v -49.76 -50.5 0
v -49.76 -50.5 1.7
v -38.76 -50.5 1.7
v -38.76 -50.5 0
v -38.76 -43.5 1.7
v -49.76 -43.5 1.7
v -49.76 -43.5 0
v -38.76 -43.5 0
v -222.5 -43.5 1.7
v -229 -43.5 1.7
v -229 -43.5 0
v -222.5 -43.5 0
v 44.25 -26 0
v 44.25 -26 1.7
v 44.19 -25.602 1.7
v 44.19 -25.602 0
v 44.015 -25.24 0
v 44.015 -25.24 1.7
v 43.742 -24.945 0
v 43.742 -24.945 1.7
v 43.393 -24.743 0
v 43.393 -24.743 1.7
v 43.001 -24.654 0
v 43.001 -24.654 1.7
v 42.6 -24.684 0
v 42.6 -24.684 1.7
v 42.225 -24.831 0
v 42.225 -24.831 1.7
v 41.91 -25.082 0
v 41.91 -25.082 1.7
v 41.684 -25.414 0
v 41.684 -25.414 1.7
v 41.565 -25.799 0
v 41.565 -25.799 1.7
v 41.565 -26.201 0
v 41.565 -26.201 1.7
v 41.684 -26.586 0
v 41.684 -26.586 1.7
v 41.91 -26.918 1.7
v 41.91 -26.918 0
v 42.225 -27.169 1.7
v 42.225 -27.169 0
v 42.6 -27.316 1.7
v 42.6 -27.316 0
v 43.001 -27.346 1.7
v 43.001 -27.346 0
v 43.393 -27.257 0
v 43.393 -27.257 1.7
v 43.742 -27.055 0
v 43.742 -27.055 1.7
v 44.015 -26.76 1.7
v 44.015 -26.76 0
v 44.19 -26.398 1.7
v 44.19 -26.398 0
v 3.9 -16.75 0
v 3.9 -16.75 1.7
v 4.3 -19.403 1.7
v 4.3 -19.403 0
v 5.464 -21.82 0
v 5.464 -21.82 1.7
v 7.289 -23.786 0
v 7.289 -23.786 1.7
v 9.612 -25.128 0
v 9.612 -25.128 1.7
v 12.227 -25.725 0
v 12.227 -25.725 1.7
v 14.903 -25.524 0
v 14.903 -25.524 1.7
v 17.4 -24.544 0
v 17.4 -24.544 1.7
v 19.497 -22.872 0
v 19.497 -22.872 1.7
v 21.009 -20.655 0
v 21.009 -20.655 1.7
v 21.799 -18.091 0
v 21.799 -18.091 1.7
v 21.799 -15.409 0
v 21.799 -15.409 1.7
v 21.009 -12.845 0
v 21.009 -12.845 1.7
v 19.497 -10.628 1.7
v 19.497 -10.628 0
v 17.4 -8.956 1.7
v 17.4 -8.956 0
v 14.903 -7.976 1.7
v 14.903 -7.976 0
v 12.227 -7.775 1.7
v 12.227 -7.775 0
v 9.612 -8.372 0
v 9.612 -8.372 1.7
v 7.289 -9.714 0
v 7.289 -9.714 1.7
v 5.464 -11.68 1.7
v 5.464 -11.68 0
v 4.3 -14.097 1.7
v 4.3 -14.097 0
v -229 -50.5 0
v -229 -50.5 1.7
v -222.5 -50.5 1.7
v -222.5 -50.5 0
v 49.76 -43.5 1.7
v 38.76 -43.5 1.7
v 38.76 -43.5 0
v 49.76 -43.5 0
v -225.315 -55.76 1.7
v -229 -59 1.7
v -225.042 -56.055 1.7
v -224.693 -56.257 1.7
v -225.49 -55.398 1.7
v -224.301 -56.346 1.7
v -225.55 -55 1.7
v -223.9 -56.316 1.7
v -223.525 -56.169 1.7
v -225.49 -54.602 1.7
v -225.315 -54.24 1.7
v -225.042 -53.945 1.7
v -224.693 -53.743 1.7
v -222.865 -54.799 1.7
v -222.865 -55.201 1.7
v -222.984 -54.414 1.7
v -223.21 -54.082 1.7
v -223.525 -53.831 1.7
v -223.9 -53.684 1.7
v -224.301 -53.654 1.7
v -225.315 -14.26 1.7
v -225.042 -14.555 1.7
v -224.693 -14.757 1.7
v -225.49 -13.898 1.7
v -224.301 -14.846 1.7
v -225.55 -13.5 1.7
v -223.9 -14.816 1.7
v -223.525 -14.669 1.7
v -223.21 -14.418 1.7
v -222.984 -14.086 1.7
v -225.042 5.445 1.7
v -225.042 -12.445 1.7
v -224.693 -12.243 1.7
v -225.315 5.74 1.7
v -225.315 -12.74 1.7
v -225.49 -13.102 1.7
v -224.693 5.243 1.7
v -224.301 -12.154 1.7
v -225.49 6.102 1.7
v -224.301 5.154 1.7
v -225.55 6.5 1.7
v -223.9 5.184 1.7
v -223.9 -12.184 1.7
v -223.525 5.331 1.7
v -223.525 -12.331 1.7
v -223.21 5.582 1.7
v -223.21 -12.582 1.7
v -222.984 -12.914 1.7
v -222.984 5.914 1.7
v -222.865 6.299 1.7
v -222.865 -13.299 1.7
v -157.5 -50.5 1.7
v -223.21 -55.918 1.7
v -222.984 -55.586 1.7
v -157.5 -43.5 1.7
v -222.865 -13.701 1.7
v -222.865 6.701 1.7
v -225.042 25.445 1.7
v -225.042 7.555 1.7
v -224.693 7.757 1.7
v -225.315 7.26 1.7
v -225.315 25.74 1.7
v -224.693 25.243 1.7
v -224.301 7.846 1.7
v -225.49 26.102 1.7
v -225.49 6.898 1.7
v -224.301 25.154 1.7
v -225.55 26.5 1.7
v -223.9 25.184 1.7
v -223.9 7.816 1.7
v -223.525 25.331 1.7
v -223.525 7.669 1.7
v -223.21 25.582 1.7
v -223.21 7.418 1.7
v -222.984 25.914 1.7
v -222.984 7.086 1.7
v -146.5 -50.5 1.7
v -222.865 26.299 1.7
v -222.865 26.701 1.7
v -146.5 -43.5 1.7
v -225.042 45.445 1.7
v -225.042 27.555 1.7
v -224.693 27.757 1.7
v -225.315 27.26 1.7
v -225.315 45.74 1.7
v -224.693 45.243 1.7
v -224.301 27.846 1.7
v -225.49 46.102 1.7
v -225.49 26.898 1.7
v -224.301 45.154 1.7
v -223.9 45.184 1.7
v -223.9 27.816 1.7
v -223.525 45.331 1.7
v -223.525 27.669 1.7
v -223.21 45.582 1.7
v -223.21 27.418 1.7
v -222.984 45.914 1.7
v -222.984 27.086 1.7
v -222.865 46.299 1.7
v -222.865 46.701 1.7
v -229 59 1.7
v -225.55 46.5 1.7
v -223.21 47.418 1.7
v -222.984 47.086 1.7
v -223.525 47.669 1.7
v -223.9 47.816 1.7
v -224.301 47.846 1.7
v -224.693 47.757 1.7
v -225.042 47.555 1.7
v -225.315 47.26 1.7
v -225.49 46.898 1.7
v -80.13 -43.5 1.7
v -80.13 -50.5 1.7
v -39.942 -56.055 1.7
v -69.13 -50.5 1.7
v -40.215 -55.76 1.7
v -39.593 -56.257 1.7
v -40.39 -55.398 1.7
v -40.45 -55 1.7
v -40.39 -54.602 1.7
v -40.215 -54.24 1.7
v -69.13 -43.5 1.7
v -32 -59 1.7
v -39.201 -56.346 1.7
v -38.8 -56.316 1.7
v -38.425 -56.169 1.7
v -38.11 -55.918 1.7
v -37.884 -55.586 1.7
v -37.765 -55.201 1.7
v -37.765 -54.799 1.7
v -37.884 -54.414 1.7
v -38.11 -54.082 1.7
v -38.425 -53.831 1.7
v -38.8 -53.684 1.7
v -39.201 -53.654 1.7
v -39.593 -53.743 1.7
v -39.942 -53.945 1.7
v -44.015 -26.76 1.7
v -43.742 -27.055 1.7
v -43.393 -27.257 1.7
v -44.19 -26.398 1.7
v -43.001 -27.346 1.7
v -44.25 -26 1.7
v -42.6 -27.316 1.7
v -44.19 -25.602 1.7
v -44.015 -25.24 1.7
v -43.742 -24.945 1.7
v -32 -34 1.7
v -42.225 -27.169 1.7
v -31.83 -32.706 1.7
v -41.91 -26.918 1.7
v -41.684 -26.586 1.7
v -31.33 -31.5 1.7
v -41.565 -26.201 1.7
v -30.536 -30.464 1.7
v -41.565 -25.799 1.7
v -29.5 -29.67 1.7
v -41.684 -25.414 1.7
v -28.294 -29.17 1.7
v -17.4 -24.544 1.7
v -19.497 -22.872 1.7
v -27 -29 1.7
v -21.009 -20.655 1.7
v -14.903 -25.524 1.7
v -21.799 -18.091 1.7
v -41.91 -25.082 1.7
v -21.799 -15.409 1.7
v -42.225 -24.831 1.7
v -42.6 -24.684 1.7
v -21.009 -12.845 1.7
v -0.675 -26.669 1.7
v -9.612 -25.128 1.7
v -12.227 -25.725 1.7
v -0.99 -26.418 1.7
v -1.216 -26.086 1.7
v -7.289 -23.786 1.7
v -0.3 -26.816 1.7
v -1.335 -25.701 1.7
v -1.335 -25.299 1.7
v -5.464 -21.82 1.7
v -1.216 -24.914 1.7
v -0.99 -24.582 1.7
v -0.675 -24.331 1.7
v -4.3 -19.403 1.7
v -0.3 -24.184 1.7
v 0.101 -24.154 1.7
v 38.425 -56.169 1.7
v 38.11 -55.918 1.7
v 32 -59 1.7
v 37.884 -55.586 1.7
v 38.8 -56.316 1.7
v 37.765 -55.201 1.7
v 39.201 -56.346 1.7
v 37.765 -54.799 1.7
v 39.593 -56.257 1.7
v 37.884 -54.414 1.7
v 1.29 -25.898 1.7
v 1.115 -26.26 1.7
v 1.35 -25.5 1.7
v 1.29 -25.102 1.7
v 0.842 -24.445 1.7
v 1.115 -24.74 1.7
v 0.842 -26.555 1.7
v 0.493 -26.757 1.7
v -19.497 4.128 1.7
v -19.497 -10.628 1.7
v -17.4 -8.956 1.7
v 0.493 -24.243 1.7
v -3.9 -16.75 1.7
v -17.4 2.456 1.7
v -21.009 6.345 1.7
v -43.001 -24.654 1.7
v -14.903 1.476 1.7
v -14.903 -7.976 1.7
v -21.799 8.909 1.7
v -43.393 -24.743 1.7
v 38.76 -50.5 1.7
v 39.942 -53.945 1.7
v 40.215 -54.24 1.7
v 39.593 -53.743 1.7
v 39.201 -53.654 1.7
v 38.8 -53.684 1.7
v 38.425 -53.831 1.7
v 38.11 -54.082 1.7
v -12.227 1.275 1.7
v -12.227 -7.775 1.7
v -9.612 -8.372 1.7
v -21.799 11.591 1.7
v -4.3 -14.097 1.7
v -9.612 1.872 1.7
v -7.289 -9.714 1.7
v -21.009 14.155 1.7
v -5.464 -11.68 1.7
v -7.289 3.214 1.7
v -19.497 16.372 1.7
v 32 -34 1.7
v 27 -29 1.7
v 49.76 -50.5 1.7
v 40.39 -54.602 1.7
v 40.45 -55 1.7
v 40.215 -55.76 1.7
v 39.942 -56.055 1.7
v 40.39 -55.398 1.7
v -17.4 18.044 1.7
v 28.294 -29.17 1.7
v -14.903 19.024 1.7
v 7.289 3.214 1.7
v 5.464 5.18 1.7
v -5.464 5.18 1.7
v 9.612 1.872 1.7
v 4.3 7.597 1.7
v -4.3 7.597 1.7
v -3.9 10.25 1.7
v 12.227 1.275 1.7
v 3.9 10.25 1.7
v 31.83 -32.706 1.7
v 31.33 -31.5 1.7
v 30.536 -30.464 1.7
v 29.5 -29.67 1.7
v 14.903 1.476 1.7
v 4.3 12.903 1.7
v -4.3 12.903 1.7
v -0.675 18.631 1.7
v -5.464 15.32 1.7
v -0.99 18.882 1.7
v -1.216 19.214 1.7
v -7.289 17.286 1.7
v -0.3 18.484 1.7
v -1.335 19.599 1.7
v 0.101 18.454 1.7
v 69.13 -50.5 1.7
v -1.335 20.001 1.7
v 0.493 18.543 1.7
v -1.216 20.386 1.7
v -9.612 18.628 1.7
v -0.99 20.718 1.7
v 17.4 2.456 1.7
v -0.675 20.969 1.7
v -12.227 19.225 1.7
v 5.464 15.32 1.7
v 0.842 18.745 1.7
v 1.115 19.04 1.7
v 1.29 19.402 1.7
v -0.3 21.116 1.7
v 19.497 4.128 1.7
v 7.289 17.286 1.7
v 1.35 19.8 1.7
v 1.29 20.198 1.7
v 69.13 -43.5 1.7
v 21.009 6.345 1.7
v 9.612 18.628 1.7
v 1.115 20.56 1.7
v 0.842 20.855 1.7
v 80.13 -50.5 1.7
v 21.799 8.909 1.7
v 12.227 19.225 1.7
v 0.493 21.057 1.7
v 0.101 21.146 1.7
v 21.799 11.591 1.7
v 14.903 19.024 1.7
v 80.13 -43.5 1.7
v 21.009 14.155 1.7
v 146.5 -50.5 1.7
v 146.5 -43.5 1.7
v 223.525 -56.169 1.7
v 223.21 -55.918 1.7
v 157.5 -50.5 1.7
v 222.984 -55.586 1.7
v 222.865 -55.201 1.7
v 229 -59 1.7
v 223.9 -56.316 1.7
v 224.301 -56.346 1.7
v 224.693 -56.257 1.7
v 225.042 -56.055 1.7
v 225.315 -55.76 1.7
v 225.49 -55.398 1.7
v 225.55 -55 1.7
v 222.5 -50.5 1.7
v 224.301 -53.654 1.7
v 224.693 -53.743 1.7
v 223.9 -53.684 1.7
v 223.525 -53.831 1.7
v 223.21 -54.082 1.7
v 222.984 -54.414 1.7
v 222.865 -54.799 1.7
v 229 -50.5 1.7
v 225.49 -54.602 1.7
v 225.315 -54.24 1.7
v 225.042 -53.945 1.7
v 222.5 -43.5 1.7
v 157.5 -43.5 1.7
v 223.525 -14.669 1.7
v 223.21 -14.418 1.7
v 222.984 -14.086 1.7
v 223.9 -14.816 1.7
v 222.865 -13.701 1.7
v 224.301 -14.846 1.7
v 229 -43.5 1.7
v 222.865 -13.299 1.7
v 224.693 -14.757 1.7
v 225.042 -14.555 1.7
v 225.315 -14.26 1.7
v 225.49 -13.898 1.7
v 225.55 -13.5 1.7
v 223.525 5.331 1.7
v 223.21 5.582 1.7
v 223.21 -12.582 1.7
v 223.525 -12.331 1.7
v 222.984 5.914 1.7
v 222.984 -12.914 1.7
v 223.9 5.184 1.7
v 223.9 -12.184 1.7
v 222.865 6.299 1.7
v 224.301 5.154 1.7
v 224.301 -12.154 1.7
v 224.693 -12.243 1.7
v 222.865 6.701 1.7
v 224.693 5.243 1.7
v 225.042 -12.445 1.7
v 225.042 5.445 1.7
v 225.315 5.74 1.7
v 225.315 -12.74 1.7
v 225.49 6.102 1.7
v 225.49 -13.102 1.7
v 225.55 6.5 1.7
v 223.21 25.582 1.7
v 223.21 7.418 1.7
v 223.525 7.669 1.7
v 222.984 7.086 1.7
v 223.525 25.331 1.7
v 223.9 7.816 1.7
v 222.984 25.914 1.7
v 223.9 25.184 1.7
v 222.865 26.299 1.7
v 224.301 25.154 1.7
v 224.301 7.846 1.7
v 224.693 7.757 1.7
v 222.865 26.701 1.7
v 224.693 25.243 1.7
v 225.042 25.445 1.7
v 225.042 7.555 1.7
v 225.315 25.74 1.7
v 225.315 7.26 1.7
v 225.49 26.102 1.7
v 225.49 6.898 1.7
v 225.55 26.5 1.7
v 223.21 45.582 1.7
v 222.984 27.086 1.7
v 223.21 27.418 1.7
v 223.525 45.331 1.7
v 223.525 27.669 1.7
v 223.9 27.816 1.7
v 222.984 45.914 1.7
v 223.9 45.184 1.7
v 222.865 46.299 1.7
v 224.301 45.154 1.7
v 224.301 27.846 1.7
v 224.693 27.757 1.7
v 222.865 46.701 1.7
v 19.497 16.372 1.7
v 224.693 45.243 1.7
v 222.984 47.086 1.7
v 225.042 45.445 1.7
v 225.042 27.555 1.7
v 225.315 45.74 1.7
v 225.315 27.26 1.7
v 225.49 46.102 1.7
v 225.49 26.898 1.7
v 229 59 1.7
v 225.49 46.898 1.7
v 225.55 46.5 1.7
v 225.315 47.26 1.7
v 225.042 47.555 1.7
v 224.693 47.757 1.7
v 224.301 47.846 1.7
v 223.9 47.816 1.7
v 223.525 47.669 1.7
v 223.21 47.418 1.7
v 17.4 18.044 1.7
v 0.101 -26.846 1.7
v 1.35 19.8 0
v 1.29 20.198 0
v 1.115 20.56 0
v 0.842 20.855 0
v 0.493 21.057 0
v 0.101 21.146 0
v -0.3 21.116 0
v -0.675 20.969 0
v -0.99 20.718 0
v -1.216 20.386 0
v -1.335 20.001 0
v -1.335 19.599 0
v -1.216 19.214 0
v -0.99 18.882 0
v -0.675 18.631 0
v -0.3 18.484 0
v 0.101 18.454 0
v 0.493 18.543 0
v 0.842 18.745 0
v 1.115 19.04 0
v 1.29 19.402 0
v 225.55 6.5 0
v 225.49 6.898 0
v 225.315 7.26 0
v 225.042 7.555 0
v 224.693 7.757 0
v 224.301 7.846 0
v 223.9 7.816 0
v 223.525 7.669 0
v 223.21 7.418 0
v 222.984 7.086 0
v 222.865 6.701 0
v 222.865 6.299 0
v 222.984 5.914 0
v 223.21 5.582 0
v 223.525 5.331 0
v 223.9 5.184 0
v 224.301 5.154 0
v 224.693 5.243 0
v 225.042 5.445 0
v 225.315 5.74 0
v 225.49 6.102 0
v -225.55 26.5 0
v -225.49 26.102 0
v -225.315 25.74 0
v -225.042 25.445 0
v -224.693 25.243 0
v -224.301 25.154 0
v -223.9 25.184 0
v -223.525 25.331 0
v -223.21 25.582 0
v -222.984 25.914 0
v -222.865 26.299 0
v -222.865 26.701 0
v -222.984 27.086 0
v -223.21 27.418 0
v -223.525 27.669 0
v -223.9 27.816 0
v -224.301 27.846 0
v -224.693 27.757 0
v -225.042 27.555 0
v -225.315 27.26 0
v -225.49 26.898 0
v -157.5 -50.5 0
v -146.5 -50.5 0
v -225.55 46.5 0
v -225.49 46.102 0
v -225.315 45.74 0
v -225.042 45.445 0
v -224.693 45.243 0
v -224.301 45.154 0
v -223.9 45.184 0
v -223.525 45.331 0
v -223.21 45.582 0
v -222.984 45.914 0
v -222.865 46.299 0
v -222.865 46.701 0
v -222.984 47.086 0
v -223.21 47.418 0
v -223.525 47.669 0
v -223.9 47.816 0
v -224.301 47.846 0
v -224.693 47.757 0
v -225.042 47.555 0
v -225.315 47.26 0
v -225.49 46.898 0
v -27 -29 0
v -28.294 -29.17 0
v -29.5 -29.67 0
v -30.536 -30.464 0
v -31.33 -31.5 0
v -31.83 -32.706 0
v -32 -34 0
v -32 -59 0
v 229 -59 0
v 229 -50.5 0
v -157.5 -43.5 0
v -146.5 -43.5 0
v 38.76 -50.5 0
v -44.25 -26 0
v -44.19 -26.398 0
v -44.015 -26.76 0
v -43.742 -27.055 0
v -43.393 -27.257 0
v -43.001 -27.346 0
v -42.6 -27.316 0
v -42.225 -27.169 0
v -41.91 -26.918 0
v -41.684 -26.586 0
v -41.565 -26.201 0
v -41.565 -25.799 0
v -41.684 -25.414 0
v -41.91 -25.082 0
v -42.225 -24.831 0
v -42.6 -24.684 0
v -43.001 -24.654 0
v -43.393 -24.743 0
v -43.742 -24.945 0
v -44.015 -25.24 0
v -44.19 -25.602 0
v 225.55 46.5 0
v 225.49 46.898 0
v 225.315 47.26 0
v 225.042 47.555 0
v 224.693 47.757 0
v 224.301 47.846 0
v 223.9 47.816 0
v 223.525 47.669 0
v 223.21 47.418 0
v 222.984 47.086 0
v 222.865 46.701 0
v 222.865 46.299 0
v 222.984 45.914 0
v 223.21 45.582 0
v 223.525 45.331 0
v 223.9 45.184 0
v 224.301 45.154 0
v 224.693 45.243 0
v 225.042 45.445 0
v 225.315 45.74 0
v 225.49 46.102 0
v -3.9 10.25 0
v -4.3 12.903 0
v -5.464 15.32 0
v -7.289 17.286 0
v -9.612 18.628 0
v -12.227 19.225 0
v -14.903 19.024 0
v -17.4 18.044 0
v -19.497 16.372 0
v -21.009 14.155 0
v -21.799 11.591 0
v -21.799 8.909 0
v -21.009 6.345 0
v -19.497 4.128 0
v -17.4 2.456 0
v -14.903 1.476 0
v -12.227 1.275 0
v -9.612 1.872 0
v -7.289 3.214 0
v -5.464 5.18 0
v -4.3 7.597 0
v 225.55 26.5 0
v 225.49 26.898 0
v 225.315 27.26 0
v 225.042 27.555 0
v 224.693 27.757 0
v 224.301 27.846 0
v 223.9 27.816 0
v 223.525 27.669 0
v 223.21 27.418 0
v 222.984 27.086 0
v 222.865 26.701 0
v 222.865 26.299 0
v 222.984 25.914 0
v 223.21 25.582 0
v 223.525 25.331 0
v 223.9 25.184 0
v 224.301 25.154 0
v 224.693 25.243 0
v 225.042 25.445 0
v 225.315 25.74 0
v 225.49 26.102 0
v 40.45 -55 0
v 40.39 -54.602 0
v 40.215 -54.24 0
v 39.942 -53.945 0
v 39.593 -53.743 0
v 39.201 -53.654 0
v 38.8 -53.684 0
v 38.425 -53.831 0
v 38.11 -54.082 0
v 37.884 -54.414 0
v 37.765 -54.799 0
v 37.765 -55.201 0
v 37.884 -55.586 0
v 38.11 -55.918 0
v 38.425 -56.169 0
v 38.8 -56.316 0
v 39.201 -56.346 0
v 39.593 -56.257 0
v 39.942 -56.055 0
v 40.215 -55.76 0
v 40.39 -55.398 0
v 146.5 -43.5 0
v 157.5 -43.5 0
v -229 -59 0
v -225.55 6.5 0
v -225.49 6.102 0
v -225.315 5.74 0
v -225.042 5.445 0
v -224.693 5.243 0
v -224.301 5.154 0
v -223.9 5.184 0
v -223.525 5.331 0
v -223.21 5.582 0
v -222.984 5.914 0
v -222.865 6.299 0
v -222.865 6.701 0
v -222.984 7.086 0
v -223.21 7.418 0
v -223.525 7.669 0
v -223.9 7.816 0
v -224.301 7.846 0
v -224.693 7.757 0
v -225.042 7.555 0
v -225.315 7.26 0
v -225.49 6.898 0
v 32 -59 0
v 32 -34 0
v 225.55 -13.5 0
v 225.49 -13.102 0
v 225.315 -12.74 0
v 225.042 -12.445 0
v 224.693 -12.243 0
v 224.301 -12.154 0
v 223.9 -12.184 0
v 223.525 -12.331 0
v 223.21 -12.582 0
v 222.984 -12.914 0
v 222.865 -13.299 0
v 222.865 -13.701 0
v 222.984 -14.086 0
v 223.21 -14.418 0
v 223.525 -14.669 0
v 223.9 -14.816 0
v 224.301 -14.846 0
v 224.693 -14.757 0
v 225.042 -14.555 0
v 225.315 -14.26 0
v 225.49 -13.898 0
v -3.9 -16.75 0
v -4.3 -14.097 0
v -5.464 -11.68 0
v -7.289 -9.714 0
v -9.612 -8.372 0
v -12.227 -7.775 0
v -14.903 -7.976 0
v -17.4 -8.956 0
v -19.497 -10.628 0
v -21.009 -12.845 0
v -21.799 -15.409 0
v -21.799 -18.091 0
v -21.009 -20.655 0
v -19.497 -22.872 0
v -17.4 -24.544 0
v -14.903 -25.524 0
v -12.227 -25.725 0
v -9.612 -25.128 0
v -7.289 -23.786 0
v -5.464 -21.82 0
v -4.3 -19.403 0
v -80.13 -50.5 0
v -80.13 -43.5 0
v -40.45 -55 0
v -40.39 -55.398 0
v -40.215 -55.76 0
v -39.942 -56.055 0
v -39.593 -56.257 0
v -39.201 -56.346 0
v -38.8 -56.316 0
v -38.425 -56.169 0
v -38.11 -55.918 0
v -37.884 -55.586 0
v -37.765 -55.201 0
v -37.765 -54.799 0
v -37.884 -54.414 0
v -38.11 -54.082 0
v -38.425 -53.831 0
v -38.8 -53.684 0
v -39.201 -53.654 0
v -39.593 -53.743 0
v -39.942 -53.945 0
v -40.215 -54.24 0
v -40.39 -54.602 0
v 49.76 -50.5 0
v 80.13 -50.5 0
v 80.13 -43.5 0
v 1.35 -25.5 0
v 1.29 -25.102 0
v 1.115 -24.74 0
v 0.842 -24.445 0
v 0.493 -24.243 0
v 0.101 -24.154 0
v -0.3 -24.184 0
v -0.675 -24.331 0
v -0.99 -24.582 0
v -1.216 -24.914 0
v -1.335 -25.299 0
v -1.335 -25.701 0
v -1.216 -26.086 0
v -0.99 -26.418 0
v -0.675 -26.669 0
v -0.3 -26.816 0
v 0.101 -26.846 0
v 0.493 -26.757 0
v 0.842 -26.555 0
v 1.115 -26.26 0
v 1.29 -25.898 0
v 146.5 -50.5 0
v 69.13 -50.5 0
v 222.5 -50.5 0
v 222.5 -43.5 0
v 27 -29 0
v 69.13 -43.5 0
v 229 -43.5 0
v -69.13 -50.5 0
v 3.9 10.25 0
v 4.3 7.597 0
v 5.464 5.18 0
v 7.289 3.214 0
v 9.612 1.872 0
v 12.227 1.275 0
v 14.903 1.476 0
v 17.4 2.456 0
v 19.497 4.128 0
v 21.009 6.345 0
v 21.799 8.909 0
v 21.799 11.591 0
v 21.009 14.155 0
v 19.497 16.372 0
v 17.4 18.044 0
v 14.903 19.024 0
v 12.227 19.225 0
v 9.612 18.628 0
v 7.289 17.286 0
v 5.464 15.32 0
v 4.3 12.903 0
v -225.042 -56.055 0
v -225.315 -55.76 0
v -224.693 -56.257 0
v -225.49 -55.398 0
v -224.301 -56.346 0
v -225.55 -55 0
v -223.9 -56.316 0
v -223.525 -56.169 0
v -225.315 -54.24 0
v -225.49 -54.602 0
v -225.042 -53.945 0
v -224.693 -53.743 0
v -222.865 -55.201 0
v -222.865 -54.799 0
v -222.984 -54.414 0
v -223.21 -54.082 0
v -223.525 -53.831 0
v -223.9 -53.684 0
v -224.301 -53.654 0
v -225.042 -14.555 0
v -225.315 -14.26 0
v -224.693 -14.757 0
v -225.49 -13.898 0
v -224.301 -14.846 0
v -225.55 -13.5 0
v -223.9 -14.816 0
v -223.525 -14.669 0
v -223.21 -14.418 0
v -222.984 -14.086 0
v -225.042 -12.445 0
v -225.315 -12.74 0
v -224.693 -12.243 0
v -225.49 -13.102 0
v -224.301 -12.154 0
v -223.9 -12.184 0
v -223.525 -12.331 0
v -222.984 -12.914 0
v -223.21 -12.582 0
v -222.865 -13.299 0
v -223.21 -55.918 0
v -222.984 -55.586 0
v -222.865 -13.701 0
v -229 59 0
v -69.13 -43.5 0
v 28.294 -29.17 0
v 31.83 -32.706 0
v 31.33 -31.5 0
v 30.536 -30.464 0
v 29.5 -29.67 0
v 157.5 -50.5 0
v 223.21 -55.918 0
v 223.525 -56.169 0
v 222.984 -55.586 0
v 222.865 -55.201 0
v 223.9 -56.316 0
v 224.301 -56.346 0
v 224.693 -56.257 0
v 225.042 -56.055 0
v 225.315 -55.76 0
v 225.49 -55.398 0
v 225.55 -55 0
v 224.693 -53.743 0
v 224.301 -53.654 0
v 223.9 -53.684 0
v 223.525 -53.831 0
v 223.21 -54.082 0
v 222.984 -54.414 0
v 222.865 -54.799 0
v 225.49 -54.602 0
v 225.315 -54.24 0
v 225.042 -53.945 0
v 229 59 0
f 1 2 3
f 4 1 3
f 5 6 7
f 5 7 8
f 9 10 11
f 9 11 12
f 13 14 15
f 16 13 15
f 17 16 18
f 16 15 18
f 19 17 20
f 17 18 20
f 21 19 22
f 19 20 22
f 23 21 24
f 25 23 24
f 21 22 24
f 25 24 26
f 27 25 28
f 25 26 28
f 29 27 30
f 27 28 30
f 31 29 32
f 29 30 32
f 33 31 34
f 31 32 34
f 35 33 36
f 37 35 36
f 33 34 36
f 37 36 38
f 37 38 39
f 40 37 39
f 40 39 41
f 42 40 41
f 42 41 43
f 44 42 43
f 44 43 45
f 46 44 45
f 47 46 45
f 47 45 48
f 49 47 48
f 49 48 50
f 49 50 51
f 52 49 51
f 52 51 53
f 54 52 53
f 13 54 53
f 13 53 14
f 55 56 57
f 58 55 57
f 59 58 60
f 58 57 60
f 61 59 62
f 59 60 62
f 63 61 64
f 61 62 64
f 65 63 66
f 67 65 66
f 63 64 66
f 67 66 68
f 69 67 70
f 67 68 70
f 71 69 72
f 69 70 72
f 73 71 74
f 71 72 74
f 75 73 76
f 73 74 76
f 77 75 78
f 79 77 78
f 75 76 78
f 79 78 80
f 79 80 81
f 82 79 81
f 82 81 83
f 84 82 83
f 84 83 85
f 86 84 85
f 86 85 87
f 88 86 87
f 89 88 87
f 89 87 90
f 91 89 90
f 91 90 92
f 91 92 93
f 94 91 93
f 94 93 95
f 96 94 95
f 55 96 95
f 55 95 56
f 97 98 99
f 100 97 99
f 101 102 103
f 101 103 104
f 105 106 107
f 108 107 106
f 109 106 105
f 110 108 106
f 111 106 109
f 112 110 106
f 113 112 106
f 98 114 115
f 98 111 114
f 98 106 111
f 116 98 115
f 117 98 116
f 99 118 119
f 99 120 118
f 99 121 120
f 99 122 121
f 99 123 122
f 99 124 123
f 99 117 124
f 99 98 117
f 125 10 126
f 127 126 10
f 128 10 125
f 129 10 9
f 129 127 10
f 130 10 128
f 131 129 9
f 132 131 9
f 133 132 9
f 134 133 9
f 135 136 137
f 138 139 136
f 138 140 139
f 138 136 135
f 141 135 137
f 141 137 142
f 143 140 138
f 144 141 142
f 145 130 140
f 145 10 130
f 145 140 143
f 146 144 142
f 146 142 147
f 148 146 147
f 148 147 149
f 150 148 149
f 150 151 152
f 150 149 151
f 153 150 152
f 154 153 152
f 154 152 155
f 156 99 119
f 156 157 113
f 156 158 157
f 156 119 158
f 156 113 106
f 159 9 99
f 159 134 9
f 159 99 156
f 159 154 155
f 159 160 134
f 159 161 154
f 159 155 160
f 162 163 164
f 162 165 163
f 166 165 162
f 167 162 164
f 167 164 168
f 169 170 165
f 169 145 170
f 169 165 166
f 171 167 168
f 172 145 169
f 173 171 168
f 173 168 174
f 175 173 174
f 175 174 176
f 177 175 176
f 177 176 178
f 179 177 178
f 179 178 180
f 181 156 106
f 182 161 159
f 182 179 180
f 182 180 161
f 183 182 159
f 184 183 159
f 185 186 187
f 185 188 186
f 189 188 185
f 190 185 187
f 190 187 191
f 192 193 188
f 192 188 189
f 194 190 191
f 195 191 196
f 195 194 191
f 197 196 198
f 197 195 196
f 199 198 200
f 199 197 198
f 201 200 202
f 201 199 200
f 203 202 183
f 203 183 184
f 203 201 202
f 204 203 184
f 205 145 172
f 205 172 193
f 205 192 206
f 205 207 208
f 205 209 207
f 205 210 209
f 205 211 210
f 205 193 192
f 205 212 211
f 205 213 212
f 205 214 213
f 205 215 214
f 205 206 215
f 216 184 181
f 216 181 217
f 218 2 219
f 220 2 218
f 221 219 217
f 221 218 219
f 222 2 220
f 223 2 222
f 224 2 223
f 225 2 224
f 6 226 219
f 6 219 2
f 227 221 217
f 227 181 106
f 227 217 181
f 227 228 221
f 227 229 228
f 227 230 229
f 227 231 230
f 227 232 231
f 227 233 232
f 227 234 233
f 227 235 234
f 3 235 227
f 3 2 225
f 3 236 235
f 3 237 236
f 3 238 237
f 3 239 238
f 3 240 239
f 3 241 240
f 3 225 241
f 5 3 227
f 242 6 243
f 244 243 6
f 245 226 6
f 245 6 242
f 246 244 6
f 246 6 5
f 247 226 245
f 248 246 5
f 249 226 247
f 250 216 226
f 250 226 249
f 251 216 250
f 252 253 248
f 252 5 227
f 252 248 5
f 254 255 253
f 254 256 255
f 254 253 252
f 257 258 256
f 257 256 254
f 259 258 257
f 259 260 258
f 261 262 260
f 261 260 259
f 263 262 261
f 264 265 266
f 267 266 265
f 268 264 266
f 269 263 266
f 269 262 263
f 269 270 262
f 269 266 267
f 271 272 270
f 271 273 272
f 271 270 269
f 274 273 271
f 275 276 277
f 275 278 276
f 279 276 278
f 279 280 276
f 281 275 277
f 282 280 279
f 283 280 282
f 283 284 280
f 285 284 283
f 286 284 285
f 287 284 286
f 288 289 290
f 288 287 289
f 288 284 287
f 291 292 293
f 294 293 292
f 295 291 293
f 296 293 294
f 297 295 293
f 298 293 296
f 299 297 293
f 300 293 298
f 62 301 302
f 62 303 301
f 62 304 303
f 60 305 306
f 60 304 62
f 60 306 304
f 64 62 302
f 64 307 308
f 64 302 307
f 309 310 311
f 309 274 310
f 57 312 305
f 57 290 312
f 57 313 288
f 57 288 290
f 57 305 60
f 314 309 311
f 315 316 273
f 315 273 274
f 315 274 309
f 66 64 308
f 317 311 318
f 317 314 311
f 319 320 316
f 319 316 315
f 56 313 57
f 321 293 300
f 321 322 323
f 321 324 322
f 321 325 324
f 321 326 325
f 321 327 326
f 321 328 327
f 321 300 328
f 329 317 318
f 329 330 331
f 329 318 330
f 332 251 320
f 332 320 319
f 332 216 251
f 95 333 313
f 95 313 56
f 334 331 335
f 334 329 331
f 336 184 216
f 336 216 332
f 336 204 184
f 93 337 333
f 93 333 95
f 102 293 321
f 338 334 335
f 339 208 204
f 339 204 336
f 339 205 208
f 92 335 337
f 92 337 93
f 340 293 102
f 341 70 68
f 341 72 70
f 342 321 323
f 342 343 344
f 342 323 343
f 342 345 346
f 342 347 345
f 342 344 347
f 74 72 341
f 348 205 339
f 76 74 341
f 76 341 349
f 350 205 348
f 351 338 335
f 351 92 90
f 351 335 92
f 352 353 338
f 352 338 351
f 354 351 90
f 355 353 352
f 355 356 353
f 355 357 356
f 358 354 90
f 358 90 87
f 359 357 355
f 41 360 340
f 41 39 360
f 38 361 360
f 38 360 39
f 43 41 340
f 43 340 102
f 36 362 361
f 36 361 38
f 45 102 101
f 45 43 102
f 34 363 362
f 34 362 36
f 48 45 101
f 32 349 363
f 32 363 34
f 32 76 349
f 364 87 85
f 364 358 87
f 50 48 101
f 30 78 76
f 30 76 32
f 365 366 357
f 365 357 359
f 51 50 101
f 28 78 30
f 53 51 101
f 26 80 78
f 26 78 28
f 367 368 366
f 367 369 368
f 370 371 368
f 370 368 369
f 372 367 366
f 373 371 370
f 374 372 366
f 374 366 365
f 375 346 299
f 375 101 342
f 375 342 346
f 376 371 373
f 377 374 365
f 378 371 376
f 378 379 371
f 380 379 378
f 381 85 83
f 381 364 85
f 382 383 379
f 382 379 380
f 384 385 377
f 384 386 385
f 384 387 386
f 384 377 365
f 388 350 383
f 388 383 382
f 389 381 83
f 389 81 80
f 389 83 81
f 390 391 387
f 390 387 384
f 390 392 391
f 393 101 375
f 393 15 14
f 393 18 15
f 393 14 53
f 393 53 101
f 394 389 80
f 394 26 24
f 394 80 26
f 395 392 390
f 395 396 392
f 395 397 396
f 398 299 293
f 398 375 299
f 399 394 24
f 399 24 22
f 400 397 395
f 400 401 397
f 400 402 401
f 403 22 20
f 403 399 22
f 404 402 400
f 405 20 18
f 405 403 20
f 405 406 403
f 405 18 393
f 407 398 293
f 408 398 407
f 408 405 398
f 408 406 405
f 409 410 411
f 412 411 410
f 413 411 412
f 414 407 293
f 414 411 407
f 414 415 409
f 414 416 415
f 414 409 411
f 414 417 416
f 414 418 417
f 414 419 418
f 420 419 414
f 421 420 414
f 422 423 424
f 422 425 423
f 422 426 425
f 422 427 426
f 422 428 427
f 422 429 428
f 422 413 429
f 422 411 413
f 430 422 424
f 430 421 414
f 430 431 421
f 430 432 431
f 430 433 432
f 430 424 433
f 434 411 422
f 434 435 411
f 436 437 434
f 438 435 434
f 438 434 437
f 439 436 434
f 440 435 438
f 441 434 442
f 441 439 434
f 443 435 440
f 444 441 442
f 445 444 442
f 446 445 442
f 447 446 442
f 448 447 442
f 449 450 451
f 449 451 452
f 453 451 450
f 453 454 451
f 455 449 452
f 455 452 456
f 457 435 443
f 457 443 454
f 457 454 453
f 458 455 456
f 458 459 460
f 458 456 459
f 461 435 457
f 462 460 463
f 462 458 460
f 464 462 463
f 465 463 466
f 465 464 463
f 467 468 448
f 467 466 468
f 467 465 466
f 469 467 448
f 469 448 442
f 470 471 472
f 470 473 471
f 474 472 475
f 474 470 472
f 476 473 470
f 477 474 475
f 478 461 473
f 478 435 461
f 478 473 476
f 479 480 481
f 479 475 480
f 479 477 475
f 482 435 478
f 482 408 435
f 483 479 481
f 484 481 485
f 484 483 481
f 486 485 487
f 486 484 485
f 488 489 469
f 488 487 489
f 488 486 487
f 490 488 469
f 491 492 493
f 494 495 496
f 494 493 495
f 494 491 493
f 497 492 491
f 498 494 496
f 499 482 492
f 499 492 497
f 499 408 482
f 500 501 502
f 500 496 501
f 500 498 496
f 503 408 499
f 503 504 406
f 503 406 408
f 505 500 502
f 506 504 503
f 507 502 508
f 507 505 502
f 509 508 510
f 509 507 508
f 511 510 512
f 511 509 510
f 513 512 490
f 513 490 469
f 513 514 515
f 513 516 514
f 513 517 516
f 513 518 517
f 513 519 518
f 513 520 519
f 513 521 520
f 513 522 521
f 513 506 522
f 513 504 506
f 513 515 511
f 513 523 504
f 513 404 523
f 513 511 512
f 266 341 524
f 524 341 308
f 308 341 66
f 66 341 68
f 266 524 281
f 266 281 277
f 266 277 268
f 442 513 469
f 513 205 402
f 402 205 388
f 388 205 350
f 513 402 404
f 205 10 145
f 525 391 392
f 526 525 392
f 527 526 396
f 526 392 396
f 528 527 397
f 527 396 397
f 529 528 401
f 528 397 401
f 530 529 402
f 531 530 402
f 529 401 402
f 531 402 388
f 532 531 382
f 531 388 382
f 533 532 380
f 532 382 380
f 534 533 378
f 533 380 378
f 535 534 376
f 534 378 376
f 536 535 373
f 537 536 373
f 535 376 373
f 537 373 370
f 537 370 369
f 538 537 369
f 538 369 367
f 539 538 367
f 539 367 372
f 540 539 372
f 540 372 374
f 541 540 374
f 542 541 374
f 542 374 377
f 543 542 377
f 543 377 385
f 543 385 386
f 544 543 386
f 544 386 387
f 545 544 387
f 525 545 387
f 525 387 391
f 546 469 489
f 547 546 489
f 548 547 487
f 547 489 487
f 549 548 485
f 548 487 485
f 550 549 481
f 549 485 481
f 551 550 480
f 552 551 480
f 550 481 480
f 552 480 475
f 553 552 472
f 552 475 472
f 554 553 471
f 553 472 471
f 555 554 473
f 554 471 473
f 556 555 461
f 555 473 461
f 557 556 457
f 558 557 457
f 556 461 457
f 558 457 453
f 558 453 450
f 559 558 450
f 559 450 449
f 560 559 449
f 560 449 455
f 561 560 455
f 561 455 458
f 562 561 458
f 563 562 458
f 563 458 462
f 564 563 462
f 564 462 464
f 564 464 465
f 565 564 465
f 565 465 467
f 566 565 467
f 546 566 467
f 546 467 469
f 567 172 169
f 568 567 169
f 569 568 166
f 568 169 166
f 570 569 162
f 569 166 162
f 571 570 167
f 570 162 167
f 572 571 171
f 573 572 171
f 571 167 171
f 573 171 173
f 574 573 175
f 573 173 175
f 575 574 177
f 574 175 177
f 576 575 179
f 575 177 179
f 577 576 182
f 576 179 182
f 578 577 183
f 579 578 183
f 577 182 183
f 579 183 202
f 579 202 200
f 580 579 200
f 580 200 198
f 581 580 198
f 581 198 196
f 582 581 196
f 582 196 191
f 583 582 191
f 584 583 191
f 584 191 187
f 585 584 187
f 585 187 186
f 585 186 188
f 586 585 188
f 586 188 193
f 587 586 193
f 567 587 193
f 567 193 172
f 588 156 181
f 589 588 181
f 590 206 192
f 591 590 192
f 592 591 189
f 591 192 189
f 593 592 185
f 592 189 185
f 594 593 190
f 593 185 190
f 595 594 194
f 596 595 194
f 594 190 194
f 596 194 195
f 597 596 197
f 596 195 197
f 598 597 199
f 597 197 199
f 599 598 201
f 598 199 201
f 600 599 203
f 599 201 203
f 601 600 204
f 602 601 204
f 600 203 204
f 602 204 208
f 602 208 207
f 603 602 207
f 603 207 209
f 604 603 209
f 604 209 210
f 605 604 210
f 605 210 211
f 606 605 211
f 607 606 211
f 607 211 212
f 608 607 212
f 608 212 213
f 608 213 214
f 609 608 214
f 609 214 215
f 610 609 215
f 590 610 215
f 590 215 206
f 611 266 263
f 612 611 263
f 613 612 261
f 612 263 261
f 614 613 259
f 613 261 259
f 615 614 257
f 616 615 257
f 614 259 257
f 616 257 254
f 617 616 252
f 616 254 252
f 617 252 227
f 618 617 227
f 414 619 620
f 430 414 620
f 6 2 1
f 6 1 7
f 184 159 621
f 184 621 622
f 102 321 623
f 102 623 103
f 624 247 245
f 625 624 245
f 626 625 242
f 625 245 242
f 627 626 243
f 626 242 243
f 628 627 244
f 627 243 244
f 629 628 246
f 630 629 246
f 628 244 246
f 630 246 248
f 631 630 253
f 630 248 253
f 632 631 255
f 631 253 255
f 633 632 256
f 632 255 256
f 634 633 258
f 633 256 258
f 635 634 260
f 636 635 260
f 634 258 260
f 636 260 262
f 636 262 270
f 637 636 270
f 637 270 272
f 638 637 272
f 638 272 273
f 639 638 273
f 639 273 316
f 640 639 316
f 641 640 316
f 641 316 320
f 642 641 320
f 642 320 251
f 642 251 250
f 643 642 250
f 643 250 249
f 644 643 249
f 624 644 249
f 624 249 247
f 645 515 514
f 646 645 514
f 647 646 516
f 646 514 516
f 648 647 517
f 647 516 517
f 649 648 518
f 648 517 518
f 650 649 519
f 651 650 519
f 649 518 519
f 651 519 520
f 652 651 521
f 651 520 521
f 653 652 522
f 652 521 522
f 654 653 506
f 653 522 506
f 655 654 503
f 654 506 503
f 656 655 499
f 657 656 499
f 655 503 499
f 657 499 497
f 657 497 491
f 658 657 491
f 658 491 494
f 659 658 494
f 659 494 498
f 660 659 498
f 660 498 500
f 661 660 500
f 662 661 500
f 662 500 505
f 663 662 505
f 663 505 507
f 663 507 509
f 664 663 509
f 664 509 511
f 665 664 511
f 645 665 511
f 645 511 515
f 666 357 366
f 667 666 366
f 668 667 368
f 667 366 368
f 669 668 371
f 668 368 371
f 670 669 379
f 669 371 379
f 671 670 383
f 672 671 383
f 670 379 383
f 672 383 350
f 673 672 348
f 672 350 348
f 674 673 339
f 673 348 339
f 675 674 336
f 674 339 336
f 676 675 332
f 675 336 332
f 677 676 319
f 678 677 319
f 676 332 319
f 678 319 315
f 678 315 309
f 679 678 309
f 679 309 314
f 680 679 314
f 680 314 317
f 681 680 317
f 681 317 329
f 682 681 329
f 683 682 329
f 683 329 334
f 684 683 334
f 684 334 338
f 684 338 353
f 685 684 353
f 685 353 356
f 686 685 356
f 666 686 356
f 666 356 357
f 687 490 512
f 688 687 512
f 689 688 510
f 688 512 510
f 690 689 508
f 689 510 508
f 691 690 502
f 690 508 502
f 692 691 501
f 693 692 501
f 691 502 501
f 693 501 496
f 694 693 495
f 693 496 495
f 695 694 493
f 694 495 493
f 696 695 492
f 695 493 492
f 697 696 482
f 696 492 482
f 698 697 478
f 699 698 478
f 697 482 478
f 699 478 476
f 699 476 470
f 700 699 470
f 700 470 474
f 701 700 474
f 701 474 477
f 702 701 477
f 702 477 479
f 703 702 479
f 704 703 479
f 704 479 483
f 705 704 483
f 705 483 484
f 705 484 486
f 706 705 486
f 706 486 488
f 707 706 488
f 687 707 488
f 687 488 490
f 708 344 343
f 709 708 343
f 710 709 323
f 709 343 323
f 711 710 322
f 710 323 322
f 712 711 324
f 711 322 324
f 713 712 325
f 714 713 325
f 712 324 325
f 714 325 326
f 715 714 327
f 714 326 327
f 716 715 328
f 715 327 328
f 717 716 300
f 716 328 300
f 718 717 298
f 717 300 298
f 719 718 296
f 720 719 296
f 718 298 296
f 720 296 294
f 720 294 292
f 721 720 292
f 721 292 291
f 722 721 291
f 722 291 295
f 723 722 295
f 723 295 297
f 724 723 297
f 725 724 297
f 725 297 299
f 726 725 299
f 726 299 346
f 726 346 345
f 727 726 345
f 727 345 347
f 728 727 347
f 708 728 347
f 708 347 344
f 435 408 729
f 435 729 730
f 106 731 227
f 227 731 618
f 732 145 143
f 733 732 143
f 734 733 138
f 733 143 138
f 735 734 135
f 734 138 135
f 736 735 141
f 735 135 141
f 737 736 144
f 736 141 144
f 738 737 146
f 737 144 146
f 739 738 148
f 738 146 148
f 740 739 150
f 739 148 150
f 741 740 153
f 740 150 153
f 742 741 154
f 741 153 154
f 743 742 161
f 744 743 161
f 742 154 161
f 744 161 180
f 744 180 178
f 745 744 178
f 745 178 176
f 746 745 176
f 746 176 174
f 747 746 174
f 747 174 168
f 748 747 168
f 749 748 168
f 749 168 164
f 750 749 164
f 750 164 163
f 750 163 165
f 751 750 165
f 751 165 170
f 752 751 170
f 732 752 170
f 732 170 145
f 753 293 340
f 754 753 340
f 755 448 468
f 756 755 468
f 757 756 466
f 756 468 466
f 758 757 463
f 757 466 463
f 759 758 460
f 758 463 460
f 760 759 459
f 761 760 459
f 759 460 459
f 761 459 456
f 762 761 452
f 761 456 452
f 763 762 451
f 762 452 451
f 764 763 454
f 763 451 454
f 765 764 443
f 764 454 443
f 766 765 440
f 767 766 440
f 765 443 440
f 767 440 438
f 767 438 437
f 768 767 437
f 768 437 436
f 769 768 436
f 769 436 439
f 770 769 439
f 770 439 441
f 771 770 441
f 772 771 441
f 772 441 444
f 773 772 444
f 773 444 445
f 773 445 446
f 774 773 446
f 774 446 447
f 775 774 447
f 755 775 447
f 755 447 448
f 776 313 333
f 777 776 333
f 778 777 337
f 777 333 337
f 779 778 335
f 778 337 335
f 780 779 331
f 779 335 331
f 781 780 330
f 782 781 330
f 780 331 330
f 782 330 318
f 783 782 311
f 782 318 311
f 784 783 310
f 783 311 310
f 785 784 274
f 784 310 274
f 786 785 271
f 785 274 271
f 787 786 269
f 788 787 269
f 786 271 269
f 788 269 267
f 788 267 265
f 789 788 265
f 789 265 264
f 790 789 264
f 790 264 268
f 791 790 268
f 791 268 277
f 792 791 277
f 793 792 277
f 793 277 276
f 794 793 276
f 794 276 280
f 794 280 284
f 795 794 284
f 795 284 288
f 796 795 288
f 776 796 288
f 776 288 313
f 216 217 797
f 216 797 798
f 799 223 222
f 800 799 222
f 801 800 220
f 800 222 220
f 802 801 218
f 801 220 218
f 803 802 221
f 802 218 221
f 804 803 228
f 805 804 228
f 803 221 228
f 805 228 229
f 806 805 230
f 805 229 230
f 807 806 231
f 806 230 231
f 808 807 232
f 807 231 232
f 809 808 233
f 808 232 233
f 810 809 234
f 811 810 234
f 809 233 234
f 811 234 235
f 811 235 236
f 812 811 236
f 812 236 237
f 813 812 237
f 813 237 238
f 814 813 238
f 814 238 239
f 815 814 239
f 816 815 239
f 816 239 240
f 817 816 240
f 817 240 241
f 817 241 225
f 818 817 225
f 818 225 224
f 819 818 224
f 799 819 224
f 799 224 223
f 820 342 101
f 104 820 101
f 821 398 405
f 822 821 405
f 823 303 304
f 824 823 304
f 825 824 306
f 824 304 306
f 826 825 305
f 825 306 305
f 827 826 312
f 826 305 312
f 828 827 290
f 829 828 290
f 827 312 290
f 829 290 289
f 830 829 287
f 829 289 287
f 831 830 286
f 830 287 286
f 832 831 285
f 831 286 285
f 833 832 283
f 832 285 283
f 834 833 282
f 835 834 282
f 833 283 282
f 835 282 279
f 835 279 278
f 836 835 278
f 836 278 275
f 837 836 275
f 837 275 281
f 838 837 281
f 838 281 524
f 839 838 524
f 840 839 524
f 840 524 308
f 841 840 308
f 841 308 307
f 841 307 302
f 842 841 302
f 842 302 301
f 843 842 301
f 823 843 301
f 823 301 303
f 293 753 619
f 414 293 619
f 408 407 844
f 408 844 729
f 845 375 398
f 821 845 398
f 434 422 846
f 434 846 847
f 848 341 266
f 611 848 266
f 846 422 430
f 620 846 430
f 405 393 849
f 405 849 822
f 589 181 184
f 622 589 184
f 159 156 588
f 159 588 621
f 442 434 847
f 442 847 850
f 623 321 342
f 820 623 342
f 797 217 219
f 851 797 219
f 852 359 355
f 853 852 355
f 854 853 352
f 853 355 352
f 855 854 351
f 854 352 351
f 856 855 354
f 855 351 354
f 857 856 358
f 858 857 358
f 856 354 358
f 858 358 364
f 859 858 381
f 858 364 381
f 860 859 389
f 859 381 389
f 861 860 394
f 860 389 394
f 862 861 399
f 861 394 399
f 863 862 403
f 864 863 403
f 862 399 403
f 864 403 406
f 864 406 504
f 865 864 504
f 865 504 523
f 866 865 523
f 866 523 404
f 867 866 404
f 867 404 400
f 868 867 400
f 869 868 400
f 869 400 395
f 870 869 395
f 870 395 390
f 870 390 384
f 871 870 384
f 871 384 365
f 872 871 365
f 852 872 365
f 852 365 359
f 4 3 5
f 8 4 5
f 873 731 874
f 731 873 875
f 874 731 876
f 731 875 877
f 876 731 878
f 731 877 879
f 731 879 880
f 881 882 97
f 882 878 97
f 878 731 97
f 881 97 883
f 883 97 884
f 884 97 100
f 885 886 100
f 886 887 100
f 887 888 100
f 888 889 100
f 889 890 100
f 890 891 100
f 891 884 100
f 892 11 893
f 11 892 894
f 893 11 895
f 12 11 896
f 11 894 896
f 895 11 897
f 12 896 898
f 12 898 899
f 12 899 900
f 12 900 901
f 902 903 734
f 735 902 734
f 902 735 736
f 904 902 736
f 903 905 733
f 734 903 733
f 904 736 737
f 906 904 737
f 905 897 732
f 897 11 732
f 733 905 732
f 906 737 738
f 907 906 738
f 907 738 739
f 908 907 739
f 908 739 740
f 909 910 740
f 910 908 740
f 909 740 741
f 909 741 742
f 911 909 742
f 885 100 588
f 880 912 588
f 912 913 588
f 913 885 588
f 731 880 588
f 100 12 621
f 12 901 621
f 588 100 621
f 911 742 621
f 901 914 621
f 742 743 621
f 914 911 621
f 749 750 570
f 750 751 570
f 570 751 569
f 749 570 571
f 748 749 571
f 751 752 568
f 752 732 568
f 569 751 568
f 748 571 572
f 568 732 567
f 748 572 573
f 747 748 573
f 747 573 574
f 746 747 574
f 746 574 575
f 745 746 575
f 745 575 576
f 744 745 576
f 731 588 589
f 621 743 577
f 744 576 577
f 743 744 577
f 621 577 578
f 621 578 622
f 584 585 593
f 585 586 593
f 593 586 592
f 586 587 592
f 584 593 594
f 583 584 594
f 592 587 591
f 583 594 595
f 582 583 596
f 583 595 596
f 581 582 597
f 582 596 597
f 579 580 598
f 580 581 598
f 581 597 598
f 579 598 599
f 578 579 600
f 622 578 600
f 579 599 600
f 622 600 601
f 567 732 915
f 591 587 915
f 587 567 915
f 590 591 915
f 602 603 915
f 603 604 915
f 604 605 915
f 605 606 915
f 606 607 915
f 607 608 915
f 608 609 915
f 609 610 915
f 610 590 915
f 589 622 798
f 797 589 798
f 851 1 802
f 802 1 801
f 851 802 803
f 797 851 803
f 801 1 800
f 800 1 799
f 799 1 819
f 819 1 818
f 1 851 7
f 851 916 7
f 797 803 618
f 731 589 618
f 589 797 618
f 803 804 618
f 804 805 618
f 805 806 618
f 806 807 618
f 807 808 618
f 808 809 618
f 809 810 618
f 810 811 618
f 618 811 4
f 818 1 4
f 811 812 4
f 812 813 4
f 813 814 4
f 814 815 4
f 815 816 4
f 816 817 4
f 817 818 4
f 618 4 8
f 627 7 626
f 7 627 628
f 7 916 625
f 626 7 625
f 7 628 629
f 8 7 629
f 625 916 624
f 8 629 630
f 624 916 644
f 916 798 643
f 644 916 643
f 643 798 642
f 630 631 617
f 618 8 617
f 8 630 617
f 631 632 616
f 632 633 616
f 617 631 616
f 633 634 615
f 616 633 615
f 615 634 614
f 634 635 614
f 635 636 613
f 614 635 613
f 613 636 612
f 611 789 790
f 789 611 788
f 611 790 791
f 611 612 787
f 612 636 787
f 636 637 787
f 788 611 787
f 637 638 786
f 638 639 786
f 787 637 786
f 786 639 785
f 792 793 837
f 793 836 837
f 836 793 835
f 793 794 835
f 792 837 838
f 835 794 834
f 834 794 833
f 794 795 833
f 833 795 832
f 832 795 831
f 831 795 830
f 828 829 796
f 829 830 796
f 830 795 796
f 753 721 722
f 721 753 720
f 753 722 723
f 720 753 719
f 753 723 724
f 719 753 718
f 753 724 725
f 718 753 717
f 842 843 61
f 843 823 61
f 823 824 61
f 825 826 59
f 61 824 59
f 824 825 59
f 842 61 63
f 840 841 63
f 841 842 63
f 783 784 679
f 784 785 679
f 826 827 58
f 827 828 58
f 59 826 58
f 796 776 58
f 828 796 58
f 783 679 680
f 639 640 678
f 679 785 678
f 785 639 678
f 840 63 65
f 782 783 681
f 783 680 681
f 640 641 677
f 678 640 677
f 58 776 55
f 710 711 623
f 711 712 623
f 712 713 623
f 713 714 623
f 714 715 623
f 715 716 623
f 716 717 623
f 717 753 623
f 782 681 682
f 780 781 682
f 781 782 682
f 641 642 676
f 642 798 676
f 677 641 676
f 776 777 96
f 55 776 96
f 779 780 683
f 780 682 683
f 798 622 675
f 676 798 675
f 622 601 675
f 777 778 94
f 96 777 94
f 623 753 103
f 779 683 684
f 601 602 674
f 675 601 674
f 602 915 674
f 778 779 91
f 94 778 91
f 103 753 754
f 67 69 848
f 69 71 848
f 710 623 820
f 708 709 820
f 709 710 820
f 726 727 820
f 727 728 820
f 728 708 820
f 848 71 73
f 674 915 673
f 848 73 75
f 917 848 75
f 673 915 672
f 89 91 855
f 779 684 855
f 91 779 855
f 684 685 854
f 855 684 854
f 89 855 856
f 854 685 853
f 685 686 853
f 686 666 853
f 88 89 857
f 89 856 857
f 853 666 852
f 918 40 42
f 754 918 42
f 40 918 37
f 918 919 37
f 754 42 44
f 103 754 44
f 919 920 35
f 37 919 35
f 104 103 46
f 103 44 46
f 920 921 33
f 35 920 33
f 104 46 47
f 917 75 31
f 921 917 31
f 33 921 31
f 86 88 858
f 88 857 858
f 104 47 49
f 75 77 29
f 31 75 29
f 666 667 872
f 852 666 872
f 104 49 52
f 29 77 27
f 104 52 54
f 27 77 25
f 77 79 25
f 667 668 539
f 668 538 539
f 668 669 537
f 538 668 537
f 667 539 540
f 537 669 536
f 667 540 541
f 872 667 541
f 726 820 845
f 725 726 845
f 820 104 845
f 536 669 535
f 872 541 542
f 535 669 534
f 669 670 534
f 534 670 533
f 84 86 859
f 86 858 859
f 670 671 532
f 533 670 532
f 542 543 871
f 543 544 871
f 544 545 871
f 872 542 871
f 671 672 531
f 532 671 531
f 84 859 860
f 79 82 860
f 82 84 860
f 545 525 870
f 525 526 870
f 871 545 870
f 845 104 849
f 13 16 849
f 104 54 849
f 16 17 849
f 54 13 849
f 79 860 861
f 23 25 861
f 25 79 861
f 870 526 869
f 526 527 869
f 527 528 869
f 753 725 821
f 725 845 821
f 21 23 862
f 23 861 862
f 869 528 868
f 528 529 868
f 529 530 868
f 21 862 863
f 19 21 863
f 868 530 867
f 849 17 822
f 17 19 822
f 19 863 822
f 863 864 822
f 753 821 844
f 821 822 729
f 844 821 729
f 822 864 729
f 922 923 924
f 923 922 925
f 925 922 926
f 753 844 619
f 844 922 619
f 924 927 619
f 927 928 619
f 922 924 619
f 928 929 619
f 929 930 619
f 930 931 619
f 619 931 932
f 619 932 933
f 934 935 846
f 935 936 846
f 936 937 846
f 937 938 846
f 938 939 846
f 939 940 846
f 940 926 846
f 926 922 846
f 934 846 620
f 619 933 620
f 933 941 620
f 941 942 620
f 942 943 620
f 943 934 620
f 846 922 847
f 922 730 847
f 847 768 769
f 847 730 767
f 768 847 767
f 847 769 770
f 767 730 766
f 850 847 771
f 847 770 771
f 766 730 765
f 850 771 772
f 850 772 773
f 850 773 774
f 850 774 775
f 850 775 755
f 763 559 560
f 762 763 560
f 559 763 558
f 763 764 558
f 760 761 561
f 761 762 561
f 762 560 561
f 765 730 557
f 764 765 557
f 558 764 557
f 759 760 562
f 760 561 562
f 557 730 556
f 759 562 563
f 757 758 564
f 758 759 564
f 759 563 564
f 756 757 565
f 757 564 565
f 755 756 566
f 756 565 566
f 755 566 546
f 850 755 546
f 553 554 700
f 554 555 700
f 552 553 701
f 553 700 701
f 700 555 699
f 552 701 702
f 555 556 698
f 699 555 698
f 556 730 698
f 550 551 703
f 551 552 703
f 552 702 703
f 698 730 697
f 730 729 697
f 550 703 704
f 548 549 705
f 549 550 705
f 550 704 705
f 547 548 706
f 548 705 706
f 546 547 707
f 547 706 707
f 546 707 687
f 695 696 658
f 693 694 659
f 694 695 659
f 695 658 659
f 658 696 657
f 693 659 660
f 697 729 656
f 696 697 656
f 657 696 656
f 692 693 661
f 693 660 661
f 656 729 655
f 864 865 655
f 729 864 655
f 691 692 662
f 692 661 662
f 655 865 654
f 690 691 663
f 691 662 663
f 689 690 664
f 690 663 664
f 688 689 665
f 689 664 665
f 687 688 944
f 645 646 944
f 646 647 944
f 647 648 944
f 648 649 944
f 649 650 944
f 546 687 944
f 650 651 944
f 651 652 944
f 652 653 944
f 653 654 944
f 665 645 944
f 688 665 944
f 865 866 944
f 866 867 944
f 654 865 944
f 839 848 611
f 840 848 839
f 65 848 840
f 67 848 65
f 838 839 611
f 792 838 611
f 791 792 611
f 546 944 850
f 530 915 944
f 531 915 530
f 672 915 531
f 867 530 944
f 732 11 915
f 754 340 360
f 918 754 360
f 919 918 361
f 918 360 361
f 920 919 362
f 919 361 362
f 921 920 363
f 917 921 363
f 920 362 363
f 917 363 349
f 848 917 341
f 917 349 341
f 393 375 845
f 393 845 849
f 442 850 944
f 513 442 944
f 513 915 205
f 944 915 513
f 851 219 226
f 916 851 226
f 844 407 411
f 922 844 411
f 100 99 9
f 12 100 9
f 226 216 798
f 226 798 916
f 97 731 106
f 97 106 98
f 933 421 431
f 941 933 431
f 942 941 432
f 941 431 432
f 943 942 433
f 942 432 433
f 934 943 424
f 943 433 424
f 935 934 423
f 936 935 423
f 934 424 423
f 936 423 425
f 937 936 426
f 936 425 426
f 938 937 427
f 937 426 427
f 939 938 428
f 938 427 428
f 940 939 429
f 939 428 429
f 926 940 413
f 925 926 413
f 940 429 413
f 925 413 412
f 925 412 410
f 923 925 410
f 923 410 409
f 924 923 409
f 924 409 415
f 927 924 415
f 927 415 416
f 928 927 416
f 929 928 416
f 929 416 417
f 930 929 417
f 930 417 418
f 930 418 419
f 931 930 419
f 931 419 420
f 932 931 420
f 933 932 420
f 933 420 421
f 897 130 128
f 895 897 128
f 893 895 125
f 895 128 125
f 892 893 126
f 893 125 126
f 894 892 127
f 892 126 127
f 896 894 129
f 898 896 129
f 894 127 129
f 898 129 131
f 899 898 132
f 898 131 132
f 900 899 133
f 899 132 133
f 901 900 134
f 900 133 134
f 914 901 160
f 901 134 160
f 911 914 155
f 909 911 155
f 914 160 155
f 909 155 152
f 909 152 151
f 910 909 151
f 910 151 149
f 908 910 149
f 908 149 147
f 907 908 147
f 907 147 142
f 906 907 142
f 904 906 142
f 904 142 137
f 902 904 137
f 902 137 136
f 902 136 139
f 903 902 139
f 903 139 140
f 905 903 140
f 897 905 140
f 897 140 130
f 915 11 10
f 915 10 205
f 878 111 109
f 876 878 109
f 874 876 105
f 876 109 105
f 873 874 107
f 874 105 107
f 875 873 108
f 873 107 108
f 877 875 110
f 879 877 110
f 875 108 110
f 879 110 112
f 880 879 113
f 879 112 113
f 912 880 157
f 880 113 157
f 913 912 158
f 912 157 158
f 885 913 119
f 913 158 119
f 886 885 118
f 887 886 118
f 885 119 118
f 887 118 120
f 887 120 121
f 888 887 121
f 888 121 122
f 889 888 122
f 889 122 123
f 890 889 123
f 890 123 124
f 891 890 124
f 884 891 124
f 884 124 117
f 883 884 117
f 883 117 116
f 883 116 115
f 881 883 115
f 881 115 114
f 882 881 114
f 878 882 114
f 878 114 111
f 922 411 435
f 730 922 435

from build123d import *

# Parameters (mm, degrees)
SKETCH3_W           = 458
SKETCH3_H           = 118
BOSS_EXTRUDE2_DEPTH = 1.7
SKETCH4_R           = 1.35
CUT_EXTRUDE1_DEPTH  = 237.484439234
CUT_EXTRUDE2_DEPTH  = 237.484439234
SKETCH6_R           = 9
CUT_EXTRUDE3_DEPTH  = 237.484439234
SKETCH8_W           = 11
SKETCH8_H           = 7
CUT_EXTRUDE4_DEPTH  = 237.484439234


with BuildPart() as part:
    # Sketch3 → Boss-Extrude2 (new body)
    with BuildSketch(Plane.XY):
        Rectangle(SKETCH3_W, SKETCH3_H)
    extrude(amount=BOSS_EXTRUDE2_DEPTH)

    # Sketch4 → Cut-Extrude1 (cut, through all)
    with BuildSketch(Plane.XY.offset(1.7)):
        with Locations((0, 19.8)):
            Circle(SKETCH4_R)
        with Locations((0, -25.5)):
            Circle(SKETCH4_R)
        with Locations((39.1, -55)):
            Circle(SKETCH4_R)
        with Locations((42.9, -26)):
            Circle(SKETCH4_R)
        with Locations((224.2, -55)):
            Circle(SKETCH4_R)
        with Locations(Location((-224.2, -55, 0), (0, 0, 180))):
            Circle(SKETCH4_R)
        with Locations(Location((-42.9, -26, 0), (0, 0, 180))):
            Circle(SKETCH4_R)
        with Locations(Location((-39.1, -55, 0), (0, 0, 180))):
            Circle(SKETCH4_R)
        with Locations((224.2, 46.5)):
            Circle(SKETCH4_R)
        with Locations((224.2, 26.5)):
            Circle(SKETCH4_R)
        with Locations((224.2, 6.5)):
            Circle(SKETCH4_R)
        with Locations((224.2, -13.5)):
            Circle(SKETCH4_R)
        with Locations(Location((-224.2, -13.5, 0), (0, 0, 180))):
            Circle(SKETCH4_R)
        with Locations(Location((-224.2, 6.5, 0), (0, 0, 180))):
            Circle(SKETCH4_R)
        with Locations(Location((-224.2, 26.5, 0), (0, 0, 180))):
            Circle(SKETCH4_R)
        with Locations(Location((-224.2, 46.5, 0), (0, 0, 180))):
            Circle(SKETCH4_R)
    extrude(amount=-CUT_EXTRUDE1_DEPTH, mode=Mode.SUBTRACT)

    # Sketch5 → Cut-Extrude2 (cut, through all)
    with BuildSketch(Plane.XY.offset(1.7)):
        with BuildLine():
            Line((-32, -59), (32, -59))
            Line((32, -59), (32, -34))
            ThreePointArc((32, -34), (30.535533906, -30.464466094), (27, -29))
            Line((27, -29), (-27, -29))
            ThreePointArc((-27, -29), (-30.535533906, -30.464466094), (-32, -34))
            Line((-32, -34), (-32, -59))
        make_face()
    extrude(amount=-CUT_EXTRUDE2_DEPTH, mode=Mode.SUBTRACT)

    # Sketch6 → Cut-Extrude3 (cut, through all)
    with BuildSketch(Plane.XY.offset(1.7)):
        with Locations((-12.9, -16.75)):
            Circle(SKETCH6_R)
        with Locations((-12.9, 10.25)):
            Circle(SKETCH6_R)
        with Locations(Location((12.9, -16.75, 0), (0, 0, 180))):
            Circle(SKETCH6_R)
        with Locations(Location((12.9, 10.25, 0), (0, 0, 180))):
            Circle(SKETCH6_R)
    extrude(amount=-CUT_EXTRUDE3_DEPTH, mode=Mode.SUBTRACT)

    # Sketch8 → Cut-Extrude4 (cut, through all)
    with BuildSketch(Plane.XY.offset(1.7)):
        with Locations((-44.26, -47)):
            Rectangle(SKETCH8_W, SKETCH8_H)
        with Locations((-74.63, -47)):
            Rectangle(SKETCH8_W, SKETCH8_H)
        with Locations((-152, -47)):
            Rectangle(SKETCH8_W, SKETCH8_H)
        with Locations((-228, -47)):
            Rectangle(SKETCH8_W, SKETCH8_H)
        with Locations((228, -47)):
            Rectangle(SKETCH8_W, SKETCH8_H)
        with Locations((152, -47)):
            Rectangle(SKETCH8_W, SKETCH8_H)
        with Locations((74.63, -47)):
            Rectangle(SKETCH8_W, SKETCH8_H)
        with Locations((44.26, -47)):
            Rectangle(SKETCH8_W, SKETCH8_H)
    extrude(amount=-CUT_EXTRUDE4_DEPTH, mode=Mode.SUBTRACT)


solid = part.part
